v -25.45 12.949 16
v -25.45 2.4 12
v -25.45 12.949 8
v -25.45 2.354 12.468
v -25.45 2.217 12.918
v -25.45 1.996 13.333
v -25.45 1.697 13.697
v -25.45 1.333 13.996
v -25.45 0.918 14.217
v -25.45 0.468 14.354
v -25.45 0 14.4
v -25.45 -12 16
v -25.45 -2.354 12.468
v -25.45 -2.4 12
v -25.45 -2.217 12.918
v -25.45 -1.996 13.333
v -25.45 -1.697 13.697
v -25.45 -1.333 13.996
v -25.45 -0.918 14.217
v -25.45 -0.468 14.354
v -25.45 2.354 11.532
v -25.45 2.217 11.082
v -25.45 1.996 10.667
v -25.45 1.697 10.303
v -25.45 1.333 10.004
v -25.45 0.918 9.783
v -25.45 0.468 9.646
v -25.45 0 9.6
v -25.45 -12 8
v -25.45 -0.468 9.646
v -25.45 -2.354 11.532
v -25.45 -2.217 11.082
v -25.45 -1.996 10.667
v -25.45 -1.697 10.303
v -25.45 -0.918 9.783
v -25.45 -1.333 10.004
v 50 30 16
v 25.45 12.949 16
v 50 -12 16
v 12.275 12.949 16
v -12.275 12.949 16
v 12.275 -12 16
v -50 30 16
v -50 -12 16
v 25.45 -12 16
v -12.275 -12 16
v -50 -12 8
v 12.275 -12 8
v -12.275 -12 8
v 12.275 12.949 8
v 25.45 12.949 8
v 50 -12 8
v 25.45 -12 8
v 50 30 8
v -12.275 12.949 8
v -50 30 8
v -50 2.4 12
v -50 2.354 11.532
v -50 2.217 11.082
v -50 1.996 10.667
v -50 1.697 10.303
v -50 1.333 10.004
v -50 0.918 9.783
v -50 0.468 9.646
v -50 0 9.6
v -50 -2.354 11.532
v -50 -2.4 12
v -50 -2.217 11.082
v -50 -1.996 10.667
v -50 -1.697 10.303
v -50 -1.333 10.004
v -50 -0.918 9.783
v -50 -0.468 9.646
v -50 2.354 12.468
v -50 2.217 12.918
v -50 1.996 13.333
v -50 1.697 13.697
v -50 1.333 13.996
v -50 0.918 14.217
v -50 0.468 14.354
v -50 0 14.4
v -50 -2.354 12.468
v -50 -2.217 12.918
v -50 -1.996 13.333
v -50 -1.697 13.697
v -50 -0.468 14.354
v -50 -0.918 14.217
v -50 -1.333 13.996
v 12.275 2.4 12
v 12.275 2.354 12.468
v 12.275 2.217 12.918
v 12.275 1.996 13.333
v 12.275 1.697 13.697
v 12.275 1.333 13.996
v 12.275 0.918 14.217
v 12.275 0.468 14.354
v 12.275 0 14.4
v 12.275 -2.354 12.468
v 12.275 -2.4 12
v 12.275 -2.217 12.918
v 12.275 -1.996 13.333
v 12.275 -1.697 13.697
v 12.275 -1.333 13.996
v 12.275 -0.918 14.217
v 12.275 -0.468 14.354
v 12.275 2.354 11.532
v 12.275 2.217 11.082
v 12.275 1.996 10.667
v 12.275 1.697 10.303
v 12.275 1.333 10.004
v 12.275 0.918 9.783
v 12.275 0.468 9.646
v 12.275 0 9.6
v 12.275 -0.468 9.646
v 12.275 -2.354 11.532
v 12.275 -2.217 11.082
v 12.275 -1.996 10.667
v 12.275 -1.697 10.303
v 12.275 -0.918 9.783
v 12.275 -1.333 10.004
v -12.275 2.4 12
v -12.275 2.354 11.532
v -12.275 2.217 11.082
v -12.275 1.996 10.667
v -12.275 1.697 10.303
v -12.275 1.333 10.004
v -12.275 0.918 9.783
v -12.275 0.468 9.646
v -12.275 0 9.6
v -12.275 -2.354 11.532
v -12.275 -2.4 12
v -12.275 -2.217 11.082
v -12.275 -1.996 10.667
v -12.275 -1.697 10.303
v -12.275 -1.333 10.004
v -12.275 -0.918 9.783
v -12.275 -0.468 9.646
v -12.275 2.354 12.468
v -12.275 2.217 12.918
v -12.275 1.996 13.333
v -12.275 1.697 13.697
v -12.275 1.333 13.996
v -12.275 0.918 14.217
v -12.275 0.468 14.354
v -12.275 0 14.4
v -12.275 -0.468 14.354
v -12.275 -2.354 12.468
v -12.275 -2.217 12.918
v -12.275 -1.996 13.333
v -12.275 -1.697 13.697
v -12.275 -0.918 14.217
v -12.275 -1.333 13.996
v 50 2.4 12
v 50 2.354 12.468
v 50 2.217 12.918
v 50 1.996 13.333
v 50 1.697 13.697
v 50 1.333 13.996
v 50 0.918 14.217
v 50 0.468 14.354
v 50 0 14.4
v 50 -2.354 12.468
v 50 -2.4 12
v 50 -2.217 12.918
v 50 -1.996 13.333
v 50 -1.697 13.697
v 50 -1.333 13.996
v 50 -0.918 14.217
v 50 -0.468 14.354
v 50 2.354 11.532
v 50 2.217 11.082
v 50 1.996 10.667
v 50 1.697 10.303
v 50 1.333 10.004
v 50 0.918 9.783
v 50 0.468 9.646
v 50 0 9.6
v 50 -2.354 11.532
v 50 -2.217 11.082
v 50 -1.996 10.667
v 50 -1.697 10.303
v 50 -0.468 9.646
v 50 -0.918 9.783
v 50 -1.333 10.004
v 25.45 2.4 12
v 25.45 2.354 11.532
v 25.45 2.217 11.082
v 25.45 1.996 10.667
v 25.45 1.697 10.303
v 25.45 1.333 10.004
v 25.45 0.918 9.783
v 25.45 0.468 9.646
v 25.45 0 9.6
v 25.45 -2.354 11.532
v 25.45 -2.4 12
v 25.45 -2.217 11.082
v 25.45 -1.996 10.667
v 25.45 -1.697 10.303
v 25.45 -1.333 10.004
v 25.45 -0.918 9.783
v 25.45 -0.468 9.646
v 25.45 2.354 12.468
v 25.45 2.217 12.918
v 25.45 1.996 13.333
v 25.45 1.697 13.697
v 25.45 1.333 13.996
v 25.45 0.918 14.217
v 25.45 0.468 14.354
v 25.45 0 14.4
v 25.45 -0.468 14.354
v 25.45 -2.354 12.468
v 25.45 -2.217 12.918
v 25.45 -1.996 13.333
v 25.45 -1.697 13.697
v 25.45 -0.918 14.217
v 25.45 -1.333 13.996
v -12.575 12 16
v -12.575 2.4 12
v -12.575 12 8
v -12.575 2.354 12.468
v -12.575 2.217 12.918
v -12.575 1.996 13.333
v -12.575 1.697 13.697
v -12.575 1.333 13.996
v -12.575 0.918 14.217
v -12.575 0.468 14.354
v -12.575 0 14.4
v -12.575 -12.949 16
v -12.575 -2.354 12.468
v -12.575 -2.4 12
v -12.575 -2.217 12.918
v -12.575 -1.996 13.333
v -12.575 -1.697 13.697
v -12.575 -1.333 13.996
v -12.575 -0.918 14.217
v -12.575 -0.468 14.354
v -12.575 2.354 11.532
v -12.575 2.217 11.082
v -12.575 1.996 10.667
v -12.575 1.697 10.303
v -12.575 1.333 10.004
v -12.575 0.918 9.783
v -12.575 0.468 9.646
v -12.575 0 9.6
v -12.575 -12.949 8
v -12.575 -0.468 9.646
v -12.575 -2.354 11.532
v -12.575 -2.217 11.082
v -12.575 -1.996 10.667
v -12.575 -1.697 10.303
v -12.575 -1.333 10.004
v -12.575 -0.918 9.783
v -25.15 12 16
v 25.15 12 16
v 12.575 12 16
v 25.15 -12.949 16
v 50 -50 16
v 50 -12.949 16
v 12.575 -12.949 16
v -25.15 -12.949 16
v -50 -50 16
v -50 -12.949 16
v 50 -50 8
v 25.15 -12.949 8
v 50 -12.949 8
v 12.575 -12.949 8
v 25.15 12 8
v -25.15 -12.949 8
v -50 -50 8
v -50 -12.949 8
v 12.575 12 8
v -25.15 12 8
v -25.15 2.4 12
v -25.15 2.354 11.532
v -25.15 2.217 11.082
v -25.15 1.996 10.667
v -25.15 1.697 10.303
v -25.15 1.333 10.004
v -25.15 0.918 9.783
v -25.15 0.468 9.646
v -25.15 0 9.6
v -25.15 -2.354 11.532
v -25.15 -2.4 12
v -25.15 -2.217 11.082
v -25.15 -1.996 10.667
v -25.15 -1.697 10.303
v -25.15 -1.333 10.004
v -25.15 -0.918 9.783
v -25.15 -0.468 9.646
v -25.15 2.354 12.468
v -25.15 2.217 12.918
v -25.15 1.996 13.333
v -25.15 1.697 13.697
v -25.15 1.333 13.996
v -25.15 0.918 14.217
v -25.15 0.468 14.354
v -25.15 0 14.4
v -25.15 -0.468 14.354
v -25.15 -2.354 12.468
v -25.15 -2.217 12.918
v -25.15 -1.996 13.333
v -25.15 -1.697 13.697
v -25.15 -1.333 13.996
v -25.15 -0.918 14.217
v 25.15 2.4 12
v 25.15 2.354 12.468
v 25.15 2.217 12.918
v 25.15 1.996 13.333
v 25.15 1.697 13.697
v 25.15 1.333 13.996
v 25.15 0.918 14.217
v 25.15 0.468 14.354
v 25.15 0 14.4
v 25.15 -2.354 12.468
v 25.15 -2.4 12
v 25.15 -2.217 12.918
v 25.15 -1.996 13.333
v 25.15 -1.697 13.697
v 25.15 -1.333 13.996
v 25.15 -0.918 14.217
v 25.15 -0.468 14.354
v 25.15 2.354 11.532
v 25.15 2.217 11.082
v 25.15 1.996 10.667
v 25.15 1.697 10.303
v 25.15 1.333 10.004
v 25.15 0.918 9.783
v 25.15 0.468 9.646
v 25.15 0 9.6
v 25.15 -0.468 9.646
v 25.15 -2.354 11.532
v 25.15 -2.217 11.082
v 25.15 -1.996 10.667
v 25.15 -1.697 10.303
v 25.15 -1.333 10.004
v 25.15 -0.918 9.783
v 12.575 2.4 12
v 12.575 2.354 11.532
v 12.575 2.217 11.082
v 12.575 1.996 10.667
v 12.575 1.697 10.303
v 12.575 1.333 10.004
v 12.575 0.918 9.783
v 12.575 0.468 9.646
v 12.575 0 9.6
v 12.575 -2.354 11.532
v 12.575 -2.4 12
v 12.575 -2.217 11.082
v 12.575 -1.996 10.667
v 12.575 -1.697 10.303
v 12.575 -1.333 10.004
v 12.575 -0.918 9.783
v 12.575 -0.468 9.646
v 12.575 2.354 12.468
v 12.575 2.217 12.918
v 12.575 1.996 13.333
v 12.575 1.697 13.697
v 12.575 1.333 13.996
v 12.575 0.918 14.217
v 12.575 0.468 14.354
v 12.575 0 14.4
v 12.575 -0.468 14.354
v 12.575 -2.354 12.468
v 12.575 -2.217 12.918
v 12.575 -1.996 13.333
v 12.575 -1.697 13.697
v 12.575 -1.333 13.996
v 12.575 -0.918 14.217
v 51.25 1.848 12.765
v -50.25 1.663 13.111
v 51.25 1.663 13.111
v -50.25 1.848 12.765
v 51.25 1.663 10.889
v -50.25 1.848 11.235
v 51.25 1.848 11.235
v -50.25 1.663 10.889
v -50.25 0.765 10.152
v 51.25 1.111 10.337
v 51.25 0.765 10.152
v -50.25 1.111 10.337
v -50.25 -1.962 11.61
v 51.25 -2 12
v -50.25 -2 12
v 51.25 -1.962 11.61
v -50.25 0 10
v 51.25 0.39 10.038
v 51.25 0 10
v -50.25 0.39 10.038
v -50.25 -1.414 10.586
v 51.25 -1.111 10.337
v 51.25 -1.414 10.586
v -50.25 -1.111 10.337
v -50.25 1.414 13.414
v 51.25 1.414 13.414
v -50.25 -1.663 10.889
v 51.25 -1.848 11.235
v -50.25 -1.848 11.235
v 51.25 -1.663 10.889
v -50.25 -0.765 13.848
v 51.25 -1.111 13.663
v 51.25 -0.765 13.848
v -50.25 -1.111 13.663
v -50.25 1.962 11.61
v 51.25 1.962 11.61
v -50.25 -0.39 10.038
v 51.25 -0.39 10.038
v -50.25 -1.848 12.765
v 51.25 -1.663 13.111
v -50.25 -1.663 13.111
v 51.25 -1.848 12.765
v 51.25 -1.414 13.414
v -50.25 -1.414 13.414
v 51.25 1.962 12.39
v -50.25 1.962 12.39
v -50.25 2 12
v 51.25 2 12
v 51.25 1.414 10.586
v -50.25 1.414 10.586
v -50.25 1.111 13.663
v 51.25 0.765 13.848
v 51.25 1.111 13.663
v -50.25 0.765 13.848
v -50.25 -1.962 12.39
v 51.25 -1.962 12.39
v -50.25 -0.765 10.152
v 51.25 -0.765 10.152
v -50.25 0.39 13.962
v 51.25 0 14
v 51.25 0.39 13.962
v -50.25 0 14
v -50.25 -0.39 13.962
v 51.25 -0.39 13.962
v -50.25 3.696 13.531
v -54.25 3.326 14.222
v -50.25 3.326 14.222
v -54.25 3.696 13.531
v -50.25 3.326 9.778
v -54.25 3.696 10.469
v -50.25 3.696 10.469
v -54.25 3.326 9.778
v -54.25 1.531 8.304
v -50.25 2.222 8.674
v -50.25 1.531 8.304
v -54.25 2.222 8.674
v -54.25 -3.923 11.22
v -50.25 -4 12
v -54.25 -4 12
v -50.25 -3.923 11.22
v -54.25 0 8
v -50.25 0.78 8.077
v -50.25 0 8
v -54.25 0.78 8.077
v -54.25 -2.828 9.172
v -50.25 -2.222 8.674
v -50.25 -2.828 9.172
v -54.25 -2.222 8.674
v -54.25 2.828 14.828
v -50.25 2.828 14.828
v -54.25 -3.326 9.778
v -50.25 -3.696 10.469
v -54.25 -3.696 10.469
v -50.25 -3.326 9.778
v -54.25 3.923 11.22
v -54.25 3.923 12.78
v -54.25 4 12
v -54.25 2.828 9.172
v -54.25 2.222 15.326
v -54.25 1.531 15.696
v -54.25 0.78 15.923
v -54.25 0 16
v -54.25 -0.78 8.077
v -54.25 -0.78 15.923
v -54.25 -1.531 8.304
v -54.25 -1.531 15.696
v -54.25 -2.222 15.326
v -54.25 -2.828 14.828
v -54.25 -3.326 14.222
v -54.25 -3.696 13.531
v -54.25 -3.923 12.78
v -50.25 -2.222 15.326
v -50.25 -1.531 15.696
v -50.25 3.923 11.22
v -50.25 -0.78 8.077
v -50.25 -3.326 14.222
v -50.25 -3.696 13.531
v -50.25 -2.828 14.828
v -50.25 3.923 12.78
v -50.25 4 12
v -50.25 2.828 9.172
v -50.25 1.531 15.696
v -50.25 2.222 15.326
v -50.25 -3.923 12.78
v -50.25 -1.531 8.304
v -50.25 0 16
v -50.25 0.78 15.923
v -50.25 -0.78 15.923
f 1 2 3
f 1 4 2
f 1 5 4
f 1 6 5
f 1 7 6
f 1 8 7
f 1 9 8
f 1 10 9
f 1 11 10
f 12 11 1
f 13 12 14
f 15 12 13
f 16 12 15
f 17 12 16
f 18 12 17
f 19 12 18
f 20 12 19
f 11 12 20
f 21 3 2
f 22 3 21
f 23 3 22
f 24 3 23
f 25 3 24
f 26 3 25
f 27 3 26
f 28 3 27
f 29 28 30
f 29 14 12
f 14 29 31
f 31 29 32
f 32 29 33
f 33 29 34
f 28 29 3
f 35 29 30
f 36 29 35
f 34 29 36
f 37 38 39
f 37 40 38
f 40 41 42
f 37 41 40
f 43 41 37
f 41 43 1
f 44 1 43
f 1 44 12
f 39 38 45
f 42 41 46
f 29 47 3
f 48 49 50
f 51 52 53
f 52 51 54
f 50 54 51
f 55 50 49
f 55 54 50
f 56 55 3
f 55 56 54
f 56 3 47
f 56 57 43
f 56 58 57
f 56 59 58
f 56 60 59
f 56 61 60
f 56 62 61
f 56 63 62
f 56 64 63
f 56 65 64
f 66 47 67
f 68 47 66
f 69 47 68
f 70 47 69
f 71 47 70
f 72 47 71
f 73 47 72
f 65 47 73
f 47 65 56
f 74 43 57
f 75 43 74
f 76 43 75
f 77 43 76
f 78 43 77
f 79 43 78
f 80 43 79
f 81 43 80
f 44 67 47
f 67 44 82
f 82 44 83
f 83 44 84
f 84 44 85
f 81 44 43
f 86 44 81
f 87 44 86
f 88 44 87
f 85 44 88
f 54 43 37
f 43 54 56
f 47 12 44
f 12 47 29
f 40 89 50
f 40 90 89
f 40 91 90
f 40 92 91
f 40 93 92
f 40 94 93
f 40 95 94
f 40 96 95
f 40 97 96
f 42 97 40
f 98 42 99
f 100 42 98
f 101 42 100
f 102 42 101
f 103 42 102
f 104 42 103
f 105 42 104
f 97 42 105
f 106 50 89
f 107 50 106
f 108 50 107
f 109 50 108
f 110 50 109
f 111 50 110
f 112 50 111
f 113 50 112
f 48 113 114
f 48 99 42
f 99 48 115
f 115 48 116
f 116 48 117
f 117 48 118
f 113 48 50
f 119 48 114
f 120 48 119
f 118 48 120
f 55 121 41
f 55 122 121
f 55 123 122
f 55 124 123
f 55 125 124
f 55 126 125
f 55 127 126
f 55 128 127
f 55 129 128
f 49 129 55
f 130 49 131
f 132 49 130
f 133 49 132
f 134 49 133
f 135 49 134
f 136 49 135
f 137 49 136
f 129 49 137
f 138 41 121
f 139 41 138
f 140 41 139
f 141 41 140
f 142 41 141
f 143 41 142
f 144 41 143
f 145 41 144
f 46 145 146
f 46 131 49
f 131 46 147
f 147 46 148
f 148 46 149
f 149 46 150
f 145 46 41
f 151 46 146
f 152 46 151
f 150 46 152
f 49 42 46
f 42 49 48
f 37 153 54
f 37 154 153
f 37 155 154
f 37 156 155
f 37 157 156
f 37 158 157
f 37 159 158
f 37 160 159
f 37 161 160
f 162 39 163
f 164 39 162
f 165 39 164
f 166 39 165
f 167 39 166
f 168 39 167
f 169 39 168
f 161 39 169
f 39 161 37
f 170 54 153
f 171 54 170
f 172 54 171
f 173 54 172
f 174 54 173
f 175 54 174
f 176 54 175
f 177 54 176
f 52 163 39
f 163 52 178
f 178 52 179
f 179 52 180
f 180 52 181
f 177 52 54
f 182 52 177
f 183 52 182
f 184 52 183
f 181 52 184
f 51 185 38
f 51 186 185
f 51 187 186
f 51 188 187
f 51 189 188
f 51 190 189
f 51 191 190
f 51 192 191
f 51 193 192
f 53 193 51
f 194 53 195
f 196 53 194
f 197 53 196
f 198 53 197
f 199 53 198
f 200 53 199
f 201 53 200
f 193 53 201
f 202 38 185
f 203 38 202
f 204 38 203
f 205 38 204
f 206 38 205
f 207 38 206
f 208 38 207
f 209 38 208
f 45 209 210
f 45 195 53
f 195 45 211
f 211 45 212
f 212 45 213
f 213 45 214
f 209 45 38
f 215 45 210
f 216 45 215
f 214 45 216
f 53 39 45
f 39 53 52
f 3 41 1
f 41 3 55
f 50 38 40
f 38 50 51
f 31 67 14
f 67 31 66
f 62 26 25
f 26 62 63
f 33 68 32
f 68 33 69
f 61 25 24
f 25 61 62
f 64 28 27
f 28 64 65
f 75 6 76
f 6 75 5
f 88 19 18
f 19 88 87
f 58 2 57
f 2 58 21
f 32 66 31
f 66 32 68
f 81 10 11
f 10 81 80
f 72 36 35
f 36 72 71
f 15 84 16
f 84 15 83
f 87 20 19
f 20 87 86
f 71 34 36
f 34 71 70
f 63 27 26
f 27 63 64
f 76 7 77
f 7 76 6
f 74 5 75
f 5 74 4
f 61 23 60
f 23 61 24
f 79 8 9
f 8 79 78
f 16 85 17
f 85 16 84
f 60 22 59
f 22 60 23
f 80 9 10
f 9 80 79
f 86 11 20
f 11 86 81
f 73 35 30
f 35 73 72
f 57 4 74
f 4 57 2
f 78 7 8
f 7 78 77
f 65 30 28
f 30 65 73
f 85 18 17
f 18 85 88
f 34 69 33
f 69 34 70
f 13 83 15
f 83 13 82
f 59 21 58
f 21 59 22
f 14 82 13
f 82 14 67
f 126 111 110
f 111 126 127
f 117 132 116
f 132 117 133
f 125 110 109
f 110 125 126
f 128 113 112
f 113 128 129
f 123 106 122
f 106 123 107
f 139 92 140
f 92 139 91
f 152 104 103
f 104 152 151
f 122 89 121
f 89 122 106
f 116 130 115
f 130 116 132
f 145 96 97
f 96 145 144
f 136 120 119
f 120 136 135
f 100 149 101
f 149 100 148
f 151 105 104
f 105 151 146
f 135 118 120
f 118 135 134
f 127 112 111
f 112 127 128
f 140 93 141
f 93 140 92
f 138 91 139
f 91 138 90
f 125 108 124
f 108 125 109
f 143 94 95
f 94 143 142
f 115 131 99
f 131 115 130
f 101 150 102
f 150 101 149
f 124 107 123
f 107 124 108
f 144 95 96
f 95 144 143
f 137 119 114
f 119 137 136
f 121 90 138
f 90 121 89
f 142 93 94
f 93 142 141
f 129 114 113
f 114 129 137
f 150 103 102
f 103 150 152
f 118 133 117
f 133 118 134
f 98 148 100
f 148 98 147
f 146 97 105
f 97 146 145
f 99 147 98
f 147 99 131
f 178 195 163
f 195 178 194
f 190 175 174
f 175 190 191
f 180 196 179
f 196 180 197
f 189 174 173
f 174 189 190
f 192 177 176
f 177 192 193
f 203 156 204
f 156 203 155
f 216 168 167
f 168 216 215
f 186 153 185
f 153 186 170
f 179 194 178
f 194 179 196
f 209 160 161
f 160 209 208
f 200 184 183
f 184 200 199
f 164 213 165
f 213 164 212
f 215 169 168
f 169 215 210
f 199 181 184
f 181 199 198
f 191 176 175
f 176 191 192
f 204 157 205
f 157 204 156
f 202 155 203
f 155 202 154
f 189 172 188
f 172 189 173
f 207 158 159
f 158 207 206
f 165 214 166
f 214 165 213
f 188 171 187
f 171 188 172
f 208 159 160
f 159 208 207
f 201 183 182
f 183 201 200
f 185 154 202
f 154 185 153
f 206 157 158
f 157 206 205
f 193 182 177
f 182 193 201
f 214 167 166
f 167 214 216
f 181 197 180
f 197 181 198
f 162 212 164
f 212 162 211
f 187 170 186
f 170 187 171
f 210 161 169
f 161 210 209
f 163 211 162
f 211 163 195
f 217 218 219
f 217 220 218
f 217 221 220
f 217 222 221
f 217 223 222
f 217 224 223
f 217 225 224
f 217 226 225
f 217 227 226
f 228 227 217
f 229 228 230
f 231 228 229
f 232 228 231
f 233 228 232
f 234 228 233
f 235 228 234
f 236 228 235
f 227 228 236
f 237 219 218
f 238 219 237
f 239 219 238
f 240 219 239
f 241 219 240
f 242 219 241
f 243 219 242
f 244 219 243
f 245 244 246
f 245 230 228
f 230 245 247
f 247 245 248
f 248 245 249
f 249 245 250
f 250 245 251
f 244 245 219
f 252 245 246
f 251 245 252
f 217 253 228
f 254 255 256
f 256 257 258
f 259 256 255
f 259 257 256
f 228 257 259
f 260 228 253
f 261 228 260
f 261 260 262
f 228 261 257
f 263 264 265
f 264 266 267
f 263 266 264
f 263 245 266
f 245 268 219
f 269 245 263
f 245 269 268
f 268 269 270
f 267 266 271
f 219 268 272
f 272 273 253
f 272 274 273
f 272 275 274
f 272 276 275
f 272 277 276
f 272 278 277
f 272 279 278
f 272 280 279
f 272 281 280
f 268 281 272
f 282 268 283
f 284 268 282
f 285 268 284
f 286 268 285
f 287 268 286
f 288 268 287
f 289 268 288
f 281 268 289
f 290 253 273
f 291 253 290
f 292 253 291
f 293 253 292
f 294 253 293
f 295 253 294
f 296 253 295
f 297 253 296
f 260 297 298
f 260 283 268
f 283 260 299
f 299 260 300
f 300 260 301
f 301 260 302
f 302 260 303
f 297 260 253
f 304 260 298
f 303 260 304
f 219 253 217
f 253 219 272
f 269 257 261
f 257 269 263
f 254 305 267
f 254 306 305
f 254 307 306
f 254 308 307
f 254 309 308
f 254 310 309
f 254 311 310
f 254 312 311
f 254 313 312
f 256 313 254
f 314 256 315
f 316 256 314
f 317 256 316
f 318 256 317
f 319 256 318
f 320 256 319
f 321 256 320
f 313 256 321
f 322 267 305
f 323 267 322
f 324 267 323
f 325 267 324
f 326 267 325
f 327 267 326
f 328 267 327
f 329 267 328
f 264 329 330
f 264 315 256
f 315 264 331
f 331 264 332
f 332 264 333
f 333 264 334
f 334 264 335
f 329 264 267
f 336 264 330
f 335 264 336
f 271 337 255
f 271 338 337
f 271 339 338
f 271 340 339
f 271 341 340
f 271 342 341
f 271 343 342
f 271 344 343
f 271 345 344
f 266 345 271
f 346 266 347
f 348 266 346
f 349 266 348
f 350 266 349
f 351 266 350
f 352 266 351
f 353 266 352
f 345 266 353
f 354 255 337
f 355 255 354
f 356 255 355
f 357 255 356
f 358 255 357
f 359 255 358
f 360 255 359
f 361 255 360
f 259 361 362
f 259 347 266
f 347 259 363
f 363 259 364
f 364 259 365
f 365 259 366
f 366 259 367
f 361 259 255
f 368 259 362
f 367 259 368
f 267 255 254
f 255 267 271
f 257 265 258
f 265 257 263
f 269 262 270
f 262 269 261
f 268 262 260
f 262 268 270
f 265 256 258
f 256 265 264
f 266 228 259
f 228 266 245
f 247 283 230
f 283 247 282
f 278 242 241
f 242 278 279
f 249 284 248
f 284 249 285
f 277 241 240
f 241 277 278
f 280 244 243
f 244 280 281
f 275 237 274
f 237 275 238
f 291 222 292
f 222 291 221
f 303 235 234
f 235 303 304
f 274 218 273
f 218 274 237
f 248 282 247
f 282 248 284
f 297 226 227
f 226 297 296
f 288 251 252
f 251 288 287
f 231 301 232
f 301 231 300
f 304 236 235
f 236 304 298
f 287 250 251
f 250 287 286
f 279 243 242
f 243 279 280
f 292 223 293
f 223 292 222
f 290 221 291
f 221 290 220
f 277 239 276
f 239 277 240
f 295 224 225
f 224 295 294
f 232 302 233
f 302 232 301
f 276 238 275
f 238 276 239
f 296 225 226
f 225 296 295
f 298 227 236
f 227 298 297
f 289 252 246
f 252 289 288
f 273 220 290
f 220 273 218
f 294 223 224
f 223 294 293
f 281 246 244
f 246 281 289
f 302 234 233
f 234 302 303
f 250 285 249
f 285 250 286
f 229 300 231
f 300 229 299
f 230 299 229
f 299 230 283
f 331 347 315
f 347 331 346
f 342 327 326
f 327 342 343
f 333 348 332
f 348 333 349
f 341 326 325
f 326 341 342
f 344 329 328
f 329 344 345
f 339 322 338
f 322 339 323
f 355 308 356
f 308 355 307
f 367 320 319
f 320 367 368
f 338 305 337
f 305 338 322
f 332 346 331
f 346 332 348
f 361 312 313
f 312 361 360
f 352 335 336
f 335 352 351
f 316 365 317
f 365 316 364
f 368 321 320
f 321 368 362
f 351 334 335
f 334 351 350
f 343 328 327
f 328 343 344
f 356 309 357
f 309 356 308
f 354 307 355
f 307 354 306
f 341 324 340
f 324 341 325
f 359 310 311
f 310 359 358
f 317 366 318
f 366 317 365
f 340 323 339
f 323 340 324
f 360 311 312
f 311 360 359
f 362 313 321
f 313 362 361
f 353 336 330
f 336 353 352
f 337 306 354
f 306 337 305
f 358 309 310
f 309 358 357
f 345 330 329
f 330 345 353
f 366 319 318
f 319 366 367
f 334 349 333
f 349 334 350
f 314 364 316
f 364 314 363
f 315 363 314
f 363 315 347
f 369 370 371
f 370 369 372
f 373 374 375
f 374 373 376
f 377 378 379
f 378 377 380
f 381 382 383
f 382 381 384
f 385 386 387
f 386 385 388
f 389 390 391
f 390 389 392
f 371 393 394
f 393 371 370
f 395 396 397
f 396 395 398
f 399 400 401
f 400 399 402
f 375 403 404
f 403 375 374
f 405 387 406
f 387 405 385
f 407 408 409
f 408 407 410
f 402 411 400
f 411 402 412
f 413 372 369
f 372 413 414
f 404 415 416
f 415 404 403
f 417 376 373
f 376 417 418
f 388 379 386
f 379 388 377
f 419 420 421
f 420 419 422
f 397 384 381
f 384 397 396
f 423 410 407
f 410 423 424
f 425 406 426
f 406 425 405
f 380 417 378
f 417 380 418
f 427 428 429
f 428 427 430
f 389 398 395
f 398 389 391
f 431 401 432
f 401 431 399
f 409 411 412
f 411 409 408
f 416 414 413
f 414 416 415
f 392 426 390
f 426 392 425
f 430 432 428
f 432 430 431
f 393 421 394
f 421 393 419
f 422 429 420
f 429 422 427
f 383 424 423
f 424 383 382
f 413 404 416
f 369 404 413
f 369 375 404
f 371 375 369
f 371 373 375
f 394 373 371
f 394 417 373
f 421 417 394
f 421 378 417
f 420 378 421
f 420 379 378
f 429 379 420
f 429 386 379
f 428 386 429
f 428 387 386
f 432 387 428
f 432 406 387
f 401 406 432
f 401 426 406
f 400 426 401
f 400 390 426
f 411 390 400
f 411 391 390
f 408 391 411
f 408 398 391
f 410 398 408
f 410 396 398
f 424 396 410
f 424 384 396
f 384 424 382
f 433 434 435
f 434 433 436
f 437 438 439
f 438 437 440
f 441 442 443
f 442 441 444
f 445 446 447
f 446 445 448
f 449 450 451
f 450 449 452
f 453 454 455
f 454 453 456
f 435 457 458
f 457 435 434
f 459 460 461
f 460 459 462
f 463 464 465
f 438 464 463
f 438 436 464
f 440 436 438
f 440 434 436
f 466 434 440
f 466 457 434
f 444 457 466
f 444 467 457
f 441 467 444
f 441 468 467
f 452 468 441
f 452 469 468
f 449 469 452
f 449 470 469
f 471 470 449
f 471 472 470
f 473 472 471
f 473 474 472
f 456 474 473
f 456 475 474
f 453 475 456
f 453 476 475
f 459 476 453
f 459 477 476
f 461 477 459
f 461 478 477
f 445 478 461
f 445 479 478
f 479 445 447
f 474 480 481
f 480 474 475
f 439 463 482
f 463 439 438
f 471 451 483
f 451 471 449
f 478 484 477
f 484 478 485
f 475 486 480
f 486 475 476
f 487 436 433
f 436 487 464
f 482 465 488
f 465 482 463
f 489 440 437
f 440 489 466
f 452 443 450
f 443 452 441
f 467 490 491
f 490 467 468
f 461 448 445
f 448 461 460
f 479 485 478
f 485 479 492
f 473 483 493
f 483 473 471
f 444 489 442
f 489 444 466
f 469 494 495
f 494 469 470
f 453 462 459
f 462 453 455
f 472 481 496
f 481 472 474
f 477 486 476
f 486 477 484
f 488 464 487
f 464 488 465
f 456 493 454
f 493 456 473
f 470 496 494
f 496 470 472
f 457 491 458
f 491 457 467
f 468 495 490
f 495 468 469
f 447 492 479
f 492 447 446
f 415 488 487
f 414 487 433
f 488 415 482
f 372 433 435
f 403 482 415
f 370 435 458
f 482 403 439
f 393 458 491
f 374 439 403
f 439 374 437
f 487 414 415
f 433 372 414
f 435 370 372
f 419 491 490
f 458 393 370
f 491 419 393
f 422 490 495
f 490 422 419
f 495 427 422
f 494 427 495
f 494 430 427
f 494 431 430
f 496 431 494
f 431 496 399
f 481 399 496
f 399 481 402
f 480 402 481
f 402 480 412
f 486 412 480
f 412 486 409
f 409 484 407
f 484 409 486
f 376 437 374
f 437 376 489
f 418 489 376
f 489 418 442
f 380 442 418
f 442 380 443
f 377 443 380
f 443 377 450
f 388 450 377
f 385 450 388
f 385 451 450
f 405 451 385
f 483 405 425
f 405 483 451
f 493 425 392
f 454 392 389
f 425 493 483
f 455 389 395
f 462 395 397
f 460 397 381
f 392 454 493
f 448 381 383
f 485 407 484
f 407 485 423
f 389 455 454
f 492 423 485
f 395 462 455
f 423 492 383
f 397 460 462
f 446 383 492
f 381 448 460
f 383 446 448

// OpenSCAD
$fn = 32;

// ------------------------------------------------------------------------
// Butt hinge: hinge 100 mm, leaf swung 0 deg
// Every part is its own module, assembly() places every instance.
// ------------------------------------------------------------------------

// --- part 1 ---
module hinge_base() {
  difference() {
    union() {
      translate([-50, -12, -4]) cube([24.55, 42, 8]);
      translate([-12.275, -12, -4]) cube([24.55, 42, 8]);
      translate([25.45, -12, -4]) cube([24.55, 42, 8]);
      translate([-50, 12.949, -4]) cube([100, 17.051, 8]);
    }
    translate([-37.725, 0, 0]) rotate([0, 90, 0]) cylinder(h = 26.55, d = 4.8, center = true);
    translate([0, 0, 0]) rotate([0, 90, 0]) cylinder(h = 26.55, d = 4.8, center = true);
    translate([37.725, 0, 0]) rotate([0, 90, 0]) cylinder(h = 26.55, d = 4.8, center = true);
  }
}

// --- part 2 ---
module hinge_mover() {
  difference() {
    union() {
      translate([-25.15, -50, -4]) cube([12.575, 62, 8]);
      translate([12.575, -50, -4]) cube([12.575, 62, 8]);
      translate([-50, -50, -4]) cube([100, 37.051, 8]);
    }
    translate([-18.863, 0, 0]) rotate([0, 90, 0]) cylinder(h = 14.575, d = 4.8, center = true);
    translate([18.863, 0, 0]) rotate([0, 90, 0]) cylinder(h = 14.575, d = 4.8, center = true);
  }
}

// --- part 3 ---
module hinge_pin() {
  rotate([0, 90, 0]) cylinder(h = 102.5, d = 4, center = true);
  translate([-54.25, 0, 0]) rotate([0, 90, 0]) cylinder(h = 4, d = 8);
}

// --- assembly ---
module assembly() {
  color([0.80, 0.24, 0.20]) translate([0, 0, 12]) rotate([0, 0, 0]) hinge_base();
  color([0.20, 0.45, 0.75]) translate([0, 0, 12]) rotate([0, 0, 0]) hinge_mover();
  color([0.25, 0.62, 0.32]) translate([0, 0, 12]) rotate([0, 0, 0]) hinge_pin();
}

assembly();
